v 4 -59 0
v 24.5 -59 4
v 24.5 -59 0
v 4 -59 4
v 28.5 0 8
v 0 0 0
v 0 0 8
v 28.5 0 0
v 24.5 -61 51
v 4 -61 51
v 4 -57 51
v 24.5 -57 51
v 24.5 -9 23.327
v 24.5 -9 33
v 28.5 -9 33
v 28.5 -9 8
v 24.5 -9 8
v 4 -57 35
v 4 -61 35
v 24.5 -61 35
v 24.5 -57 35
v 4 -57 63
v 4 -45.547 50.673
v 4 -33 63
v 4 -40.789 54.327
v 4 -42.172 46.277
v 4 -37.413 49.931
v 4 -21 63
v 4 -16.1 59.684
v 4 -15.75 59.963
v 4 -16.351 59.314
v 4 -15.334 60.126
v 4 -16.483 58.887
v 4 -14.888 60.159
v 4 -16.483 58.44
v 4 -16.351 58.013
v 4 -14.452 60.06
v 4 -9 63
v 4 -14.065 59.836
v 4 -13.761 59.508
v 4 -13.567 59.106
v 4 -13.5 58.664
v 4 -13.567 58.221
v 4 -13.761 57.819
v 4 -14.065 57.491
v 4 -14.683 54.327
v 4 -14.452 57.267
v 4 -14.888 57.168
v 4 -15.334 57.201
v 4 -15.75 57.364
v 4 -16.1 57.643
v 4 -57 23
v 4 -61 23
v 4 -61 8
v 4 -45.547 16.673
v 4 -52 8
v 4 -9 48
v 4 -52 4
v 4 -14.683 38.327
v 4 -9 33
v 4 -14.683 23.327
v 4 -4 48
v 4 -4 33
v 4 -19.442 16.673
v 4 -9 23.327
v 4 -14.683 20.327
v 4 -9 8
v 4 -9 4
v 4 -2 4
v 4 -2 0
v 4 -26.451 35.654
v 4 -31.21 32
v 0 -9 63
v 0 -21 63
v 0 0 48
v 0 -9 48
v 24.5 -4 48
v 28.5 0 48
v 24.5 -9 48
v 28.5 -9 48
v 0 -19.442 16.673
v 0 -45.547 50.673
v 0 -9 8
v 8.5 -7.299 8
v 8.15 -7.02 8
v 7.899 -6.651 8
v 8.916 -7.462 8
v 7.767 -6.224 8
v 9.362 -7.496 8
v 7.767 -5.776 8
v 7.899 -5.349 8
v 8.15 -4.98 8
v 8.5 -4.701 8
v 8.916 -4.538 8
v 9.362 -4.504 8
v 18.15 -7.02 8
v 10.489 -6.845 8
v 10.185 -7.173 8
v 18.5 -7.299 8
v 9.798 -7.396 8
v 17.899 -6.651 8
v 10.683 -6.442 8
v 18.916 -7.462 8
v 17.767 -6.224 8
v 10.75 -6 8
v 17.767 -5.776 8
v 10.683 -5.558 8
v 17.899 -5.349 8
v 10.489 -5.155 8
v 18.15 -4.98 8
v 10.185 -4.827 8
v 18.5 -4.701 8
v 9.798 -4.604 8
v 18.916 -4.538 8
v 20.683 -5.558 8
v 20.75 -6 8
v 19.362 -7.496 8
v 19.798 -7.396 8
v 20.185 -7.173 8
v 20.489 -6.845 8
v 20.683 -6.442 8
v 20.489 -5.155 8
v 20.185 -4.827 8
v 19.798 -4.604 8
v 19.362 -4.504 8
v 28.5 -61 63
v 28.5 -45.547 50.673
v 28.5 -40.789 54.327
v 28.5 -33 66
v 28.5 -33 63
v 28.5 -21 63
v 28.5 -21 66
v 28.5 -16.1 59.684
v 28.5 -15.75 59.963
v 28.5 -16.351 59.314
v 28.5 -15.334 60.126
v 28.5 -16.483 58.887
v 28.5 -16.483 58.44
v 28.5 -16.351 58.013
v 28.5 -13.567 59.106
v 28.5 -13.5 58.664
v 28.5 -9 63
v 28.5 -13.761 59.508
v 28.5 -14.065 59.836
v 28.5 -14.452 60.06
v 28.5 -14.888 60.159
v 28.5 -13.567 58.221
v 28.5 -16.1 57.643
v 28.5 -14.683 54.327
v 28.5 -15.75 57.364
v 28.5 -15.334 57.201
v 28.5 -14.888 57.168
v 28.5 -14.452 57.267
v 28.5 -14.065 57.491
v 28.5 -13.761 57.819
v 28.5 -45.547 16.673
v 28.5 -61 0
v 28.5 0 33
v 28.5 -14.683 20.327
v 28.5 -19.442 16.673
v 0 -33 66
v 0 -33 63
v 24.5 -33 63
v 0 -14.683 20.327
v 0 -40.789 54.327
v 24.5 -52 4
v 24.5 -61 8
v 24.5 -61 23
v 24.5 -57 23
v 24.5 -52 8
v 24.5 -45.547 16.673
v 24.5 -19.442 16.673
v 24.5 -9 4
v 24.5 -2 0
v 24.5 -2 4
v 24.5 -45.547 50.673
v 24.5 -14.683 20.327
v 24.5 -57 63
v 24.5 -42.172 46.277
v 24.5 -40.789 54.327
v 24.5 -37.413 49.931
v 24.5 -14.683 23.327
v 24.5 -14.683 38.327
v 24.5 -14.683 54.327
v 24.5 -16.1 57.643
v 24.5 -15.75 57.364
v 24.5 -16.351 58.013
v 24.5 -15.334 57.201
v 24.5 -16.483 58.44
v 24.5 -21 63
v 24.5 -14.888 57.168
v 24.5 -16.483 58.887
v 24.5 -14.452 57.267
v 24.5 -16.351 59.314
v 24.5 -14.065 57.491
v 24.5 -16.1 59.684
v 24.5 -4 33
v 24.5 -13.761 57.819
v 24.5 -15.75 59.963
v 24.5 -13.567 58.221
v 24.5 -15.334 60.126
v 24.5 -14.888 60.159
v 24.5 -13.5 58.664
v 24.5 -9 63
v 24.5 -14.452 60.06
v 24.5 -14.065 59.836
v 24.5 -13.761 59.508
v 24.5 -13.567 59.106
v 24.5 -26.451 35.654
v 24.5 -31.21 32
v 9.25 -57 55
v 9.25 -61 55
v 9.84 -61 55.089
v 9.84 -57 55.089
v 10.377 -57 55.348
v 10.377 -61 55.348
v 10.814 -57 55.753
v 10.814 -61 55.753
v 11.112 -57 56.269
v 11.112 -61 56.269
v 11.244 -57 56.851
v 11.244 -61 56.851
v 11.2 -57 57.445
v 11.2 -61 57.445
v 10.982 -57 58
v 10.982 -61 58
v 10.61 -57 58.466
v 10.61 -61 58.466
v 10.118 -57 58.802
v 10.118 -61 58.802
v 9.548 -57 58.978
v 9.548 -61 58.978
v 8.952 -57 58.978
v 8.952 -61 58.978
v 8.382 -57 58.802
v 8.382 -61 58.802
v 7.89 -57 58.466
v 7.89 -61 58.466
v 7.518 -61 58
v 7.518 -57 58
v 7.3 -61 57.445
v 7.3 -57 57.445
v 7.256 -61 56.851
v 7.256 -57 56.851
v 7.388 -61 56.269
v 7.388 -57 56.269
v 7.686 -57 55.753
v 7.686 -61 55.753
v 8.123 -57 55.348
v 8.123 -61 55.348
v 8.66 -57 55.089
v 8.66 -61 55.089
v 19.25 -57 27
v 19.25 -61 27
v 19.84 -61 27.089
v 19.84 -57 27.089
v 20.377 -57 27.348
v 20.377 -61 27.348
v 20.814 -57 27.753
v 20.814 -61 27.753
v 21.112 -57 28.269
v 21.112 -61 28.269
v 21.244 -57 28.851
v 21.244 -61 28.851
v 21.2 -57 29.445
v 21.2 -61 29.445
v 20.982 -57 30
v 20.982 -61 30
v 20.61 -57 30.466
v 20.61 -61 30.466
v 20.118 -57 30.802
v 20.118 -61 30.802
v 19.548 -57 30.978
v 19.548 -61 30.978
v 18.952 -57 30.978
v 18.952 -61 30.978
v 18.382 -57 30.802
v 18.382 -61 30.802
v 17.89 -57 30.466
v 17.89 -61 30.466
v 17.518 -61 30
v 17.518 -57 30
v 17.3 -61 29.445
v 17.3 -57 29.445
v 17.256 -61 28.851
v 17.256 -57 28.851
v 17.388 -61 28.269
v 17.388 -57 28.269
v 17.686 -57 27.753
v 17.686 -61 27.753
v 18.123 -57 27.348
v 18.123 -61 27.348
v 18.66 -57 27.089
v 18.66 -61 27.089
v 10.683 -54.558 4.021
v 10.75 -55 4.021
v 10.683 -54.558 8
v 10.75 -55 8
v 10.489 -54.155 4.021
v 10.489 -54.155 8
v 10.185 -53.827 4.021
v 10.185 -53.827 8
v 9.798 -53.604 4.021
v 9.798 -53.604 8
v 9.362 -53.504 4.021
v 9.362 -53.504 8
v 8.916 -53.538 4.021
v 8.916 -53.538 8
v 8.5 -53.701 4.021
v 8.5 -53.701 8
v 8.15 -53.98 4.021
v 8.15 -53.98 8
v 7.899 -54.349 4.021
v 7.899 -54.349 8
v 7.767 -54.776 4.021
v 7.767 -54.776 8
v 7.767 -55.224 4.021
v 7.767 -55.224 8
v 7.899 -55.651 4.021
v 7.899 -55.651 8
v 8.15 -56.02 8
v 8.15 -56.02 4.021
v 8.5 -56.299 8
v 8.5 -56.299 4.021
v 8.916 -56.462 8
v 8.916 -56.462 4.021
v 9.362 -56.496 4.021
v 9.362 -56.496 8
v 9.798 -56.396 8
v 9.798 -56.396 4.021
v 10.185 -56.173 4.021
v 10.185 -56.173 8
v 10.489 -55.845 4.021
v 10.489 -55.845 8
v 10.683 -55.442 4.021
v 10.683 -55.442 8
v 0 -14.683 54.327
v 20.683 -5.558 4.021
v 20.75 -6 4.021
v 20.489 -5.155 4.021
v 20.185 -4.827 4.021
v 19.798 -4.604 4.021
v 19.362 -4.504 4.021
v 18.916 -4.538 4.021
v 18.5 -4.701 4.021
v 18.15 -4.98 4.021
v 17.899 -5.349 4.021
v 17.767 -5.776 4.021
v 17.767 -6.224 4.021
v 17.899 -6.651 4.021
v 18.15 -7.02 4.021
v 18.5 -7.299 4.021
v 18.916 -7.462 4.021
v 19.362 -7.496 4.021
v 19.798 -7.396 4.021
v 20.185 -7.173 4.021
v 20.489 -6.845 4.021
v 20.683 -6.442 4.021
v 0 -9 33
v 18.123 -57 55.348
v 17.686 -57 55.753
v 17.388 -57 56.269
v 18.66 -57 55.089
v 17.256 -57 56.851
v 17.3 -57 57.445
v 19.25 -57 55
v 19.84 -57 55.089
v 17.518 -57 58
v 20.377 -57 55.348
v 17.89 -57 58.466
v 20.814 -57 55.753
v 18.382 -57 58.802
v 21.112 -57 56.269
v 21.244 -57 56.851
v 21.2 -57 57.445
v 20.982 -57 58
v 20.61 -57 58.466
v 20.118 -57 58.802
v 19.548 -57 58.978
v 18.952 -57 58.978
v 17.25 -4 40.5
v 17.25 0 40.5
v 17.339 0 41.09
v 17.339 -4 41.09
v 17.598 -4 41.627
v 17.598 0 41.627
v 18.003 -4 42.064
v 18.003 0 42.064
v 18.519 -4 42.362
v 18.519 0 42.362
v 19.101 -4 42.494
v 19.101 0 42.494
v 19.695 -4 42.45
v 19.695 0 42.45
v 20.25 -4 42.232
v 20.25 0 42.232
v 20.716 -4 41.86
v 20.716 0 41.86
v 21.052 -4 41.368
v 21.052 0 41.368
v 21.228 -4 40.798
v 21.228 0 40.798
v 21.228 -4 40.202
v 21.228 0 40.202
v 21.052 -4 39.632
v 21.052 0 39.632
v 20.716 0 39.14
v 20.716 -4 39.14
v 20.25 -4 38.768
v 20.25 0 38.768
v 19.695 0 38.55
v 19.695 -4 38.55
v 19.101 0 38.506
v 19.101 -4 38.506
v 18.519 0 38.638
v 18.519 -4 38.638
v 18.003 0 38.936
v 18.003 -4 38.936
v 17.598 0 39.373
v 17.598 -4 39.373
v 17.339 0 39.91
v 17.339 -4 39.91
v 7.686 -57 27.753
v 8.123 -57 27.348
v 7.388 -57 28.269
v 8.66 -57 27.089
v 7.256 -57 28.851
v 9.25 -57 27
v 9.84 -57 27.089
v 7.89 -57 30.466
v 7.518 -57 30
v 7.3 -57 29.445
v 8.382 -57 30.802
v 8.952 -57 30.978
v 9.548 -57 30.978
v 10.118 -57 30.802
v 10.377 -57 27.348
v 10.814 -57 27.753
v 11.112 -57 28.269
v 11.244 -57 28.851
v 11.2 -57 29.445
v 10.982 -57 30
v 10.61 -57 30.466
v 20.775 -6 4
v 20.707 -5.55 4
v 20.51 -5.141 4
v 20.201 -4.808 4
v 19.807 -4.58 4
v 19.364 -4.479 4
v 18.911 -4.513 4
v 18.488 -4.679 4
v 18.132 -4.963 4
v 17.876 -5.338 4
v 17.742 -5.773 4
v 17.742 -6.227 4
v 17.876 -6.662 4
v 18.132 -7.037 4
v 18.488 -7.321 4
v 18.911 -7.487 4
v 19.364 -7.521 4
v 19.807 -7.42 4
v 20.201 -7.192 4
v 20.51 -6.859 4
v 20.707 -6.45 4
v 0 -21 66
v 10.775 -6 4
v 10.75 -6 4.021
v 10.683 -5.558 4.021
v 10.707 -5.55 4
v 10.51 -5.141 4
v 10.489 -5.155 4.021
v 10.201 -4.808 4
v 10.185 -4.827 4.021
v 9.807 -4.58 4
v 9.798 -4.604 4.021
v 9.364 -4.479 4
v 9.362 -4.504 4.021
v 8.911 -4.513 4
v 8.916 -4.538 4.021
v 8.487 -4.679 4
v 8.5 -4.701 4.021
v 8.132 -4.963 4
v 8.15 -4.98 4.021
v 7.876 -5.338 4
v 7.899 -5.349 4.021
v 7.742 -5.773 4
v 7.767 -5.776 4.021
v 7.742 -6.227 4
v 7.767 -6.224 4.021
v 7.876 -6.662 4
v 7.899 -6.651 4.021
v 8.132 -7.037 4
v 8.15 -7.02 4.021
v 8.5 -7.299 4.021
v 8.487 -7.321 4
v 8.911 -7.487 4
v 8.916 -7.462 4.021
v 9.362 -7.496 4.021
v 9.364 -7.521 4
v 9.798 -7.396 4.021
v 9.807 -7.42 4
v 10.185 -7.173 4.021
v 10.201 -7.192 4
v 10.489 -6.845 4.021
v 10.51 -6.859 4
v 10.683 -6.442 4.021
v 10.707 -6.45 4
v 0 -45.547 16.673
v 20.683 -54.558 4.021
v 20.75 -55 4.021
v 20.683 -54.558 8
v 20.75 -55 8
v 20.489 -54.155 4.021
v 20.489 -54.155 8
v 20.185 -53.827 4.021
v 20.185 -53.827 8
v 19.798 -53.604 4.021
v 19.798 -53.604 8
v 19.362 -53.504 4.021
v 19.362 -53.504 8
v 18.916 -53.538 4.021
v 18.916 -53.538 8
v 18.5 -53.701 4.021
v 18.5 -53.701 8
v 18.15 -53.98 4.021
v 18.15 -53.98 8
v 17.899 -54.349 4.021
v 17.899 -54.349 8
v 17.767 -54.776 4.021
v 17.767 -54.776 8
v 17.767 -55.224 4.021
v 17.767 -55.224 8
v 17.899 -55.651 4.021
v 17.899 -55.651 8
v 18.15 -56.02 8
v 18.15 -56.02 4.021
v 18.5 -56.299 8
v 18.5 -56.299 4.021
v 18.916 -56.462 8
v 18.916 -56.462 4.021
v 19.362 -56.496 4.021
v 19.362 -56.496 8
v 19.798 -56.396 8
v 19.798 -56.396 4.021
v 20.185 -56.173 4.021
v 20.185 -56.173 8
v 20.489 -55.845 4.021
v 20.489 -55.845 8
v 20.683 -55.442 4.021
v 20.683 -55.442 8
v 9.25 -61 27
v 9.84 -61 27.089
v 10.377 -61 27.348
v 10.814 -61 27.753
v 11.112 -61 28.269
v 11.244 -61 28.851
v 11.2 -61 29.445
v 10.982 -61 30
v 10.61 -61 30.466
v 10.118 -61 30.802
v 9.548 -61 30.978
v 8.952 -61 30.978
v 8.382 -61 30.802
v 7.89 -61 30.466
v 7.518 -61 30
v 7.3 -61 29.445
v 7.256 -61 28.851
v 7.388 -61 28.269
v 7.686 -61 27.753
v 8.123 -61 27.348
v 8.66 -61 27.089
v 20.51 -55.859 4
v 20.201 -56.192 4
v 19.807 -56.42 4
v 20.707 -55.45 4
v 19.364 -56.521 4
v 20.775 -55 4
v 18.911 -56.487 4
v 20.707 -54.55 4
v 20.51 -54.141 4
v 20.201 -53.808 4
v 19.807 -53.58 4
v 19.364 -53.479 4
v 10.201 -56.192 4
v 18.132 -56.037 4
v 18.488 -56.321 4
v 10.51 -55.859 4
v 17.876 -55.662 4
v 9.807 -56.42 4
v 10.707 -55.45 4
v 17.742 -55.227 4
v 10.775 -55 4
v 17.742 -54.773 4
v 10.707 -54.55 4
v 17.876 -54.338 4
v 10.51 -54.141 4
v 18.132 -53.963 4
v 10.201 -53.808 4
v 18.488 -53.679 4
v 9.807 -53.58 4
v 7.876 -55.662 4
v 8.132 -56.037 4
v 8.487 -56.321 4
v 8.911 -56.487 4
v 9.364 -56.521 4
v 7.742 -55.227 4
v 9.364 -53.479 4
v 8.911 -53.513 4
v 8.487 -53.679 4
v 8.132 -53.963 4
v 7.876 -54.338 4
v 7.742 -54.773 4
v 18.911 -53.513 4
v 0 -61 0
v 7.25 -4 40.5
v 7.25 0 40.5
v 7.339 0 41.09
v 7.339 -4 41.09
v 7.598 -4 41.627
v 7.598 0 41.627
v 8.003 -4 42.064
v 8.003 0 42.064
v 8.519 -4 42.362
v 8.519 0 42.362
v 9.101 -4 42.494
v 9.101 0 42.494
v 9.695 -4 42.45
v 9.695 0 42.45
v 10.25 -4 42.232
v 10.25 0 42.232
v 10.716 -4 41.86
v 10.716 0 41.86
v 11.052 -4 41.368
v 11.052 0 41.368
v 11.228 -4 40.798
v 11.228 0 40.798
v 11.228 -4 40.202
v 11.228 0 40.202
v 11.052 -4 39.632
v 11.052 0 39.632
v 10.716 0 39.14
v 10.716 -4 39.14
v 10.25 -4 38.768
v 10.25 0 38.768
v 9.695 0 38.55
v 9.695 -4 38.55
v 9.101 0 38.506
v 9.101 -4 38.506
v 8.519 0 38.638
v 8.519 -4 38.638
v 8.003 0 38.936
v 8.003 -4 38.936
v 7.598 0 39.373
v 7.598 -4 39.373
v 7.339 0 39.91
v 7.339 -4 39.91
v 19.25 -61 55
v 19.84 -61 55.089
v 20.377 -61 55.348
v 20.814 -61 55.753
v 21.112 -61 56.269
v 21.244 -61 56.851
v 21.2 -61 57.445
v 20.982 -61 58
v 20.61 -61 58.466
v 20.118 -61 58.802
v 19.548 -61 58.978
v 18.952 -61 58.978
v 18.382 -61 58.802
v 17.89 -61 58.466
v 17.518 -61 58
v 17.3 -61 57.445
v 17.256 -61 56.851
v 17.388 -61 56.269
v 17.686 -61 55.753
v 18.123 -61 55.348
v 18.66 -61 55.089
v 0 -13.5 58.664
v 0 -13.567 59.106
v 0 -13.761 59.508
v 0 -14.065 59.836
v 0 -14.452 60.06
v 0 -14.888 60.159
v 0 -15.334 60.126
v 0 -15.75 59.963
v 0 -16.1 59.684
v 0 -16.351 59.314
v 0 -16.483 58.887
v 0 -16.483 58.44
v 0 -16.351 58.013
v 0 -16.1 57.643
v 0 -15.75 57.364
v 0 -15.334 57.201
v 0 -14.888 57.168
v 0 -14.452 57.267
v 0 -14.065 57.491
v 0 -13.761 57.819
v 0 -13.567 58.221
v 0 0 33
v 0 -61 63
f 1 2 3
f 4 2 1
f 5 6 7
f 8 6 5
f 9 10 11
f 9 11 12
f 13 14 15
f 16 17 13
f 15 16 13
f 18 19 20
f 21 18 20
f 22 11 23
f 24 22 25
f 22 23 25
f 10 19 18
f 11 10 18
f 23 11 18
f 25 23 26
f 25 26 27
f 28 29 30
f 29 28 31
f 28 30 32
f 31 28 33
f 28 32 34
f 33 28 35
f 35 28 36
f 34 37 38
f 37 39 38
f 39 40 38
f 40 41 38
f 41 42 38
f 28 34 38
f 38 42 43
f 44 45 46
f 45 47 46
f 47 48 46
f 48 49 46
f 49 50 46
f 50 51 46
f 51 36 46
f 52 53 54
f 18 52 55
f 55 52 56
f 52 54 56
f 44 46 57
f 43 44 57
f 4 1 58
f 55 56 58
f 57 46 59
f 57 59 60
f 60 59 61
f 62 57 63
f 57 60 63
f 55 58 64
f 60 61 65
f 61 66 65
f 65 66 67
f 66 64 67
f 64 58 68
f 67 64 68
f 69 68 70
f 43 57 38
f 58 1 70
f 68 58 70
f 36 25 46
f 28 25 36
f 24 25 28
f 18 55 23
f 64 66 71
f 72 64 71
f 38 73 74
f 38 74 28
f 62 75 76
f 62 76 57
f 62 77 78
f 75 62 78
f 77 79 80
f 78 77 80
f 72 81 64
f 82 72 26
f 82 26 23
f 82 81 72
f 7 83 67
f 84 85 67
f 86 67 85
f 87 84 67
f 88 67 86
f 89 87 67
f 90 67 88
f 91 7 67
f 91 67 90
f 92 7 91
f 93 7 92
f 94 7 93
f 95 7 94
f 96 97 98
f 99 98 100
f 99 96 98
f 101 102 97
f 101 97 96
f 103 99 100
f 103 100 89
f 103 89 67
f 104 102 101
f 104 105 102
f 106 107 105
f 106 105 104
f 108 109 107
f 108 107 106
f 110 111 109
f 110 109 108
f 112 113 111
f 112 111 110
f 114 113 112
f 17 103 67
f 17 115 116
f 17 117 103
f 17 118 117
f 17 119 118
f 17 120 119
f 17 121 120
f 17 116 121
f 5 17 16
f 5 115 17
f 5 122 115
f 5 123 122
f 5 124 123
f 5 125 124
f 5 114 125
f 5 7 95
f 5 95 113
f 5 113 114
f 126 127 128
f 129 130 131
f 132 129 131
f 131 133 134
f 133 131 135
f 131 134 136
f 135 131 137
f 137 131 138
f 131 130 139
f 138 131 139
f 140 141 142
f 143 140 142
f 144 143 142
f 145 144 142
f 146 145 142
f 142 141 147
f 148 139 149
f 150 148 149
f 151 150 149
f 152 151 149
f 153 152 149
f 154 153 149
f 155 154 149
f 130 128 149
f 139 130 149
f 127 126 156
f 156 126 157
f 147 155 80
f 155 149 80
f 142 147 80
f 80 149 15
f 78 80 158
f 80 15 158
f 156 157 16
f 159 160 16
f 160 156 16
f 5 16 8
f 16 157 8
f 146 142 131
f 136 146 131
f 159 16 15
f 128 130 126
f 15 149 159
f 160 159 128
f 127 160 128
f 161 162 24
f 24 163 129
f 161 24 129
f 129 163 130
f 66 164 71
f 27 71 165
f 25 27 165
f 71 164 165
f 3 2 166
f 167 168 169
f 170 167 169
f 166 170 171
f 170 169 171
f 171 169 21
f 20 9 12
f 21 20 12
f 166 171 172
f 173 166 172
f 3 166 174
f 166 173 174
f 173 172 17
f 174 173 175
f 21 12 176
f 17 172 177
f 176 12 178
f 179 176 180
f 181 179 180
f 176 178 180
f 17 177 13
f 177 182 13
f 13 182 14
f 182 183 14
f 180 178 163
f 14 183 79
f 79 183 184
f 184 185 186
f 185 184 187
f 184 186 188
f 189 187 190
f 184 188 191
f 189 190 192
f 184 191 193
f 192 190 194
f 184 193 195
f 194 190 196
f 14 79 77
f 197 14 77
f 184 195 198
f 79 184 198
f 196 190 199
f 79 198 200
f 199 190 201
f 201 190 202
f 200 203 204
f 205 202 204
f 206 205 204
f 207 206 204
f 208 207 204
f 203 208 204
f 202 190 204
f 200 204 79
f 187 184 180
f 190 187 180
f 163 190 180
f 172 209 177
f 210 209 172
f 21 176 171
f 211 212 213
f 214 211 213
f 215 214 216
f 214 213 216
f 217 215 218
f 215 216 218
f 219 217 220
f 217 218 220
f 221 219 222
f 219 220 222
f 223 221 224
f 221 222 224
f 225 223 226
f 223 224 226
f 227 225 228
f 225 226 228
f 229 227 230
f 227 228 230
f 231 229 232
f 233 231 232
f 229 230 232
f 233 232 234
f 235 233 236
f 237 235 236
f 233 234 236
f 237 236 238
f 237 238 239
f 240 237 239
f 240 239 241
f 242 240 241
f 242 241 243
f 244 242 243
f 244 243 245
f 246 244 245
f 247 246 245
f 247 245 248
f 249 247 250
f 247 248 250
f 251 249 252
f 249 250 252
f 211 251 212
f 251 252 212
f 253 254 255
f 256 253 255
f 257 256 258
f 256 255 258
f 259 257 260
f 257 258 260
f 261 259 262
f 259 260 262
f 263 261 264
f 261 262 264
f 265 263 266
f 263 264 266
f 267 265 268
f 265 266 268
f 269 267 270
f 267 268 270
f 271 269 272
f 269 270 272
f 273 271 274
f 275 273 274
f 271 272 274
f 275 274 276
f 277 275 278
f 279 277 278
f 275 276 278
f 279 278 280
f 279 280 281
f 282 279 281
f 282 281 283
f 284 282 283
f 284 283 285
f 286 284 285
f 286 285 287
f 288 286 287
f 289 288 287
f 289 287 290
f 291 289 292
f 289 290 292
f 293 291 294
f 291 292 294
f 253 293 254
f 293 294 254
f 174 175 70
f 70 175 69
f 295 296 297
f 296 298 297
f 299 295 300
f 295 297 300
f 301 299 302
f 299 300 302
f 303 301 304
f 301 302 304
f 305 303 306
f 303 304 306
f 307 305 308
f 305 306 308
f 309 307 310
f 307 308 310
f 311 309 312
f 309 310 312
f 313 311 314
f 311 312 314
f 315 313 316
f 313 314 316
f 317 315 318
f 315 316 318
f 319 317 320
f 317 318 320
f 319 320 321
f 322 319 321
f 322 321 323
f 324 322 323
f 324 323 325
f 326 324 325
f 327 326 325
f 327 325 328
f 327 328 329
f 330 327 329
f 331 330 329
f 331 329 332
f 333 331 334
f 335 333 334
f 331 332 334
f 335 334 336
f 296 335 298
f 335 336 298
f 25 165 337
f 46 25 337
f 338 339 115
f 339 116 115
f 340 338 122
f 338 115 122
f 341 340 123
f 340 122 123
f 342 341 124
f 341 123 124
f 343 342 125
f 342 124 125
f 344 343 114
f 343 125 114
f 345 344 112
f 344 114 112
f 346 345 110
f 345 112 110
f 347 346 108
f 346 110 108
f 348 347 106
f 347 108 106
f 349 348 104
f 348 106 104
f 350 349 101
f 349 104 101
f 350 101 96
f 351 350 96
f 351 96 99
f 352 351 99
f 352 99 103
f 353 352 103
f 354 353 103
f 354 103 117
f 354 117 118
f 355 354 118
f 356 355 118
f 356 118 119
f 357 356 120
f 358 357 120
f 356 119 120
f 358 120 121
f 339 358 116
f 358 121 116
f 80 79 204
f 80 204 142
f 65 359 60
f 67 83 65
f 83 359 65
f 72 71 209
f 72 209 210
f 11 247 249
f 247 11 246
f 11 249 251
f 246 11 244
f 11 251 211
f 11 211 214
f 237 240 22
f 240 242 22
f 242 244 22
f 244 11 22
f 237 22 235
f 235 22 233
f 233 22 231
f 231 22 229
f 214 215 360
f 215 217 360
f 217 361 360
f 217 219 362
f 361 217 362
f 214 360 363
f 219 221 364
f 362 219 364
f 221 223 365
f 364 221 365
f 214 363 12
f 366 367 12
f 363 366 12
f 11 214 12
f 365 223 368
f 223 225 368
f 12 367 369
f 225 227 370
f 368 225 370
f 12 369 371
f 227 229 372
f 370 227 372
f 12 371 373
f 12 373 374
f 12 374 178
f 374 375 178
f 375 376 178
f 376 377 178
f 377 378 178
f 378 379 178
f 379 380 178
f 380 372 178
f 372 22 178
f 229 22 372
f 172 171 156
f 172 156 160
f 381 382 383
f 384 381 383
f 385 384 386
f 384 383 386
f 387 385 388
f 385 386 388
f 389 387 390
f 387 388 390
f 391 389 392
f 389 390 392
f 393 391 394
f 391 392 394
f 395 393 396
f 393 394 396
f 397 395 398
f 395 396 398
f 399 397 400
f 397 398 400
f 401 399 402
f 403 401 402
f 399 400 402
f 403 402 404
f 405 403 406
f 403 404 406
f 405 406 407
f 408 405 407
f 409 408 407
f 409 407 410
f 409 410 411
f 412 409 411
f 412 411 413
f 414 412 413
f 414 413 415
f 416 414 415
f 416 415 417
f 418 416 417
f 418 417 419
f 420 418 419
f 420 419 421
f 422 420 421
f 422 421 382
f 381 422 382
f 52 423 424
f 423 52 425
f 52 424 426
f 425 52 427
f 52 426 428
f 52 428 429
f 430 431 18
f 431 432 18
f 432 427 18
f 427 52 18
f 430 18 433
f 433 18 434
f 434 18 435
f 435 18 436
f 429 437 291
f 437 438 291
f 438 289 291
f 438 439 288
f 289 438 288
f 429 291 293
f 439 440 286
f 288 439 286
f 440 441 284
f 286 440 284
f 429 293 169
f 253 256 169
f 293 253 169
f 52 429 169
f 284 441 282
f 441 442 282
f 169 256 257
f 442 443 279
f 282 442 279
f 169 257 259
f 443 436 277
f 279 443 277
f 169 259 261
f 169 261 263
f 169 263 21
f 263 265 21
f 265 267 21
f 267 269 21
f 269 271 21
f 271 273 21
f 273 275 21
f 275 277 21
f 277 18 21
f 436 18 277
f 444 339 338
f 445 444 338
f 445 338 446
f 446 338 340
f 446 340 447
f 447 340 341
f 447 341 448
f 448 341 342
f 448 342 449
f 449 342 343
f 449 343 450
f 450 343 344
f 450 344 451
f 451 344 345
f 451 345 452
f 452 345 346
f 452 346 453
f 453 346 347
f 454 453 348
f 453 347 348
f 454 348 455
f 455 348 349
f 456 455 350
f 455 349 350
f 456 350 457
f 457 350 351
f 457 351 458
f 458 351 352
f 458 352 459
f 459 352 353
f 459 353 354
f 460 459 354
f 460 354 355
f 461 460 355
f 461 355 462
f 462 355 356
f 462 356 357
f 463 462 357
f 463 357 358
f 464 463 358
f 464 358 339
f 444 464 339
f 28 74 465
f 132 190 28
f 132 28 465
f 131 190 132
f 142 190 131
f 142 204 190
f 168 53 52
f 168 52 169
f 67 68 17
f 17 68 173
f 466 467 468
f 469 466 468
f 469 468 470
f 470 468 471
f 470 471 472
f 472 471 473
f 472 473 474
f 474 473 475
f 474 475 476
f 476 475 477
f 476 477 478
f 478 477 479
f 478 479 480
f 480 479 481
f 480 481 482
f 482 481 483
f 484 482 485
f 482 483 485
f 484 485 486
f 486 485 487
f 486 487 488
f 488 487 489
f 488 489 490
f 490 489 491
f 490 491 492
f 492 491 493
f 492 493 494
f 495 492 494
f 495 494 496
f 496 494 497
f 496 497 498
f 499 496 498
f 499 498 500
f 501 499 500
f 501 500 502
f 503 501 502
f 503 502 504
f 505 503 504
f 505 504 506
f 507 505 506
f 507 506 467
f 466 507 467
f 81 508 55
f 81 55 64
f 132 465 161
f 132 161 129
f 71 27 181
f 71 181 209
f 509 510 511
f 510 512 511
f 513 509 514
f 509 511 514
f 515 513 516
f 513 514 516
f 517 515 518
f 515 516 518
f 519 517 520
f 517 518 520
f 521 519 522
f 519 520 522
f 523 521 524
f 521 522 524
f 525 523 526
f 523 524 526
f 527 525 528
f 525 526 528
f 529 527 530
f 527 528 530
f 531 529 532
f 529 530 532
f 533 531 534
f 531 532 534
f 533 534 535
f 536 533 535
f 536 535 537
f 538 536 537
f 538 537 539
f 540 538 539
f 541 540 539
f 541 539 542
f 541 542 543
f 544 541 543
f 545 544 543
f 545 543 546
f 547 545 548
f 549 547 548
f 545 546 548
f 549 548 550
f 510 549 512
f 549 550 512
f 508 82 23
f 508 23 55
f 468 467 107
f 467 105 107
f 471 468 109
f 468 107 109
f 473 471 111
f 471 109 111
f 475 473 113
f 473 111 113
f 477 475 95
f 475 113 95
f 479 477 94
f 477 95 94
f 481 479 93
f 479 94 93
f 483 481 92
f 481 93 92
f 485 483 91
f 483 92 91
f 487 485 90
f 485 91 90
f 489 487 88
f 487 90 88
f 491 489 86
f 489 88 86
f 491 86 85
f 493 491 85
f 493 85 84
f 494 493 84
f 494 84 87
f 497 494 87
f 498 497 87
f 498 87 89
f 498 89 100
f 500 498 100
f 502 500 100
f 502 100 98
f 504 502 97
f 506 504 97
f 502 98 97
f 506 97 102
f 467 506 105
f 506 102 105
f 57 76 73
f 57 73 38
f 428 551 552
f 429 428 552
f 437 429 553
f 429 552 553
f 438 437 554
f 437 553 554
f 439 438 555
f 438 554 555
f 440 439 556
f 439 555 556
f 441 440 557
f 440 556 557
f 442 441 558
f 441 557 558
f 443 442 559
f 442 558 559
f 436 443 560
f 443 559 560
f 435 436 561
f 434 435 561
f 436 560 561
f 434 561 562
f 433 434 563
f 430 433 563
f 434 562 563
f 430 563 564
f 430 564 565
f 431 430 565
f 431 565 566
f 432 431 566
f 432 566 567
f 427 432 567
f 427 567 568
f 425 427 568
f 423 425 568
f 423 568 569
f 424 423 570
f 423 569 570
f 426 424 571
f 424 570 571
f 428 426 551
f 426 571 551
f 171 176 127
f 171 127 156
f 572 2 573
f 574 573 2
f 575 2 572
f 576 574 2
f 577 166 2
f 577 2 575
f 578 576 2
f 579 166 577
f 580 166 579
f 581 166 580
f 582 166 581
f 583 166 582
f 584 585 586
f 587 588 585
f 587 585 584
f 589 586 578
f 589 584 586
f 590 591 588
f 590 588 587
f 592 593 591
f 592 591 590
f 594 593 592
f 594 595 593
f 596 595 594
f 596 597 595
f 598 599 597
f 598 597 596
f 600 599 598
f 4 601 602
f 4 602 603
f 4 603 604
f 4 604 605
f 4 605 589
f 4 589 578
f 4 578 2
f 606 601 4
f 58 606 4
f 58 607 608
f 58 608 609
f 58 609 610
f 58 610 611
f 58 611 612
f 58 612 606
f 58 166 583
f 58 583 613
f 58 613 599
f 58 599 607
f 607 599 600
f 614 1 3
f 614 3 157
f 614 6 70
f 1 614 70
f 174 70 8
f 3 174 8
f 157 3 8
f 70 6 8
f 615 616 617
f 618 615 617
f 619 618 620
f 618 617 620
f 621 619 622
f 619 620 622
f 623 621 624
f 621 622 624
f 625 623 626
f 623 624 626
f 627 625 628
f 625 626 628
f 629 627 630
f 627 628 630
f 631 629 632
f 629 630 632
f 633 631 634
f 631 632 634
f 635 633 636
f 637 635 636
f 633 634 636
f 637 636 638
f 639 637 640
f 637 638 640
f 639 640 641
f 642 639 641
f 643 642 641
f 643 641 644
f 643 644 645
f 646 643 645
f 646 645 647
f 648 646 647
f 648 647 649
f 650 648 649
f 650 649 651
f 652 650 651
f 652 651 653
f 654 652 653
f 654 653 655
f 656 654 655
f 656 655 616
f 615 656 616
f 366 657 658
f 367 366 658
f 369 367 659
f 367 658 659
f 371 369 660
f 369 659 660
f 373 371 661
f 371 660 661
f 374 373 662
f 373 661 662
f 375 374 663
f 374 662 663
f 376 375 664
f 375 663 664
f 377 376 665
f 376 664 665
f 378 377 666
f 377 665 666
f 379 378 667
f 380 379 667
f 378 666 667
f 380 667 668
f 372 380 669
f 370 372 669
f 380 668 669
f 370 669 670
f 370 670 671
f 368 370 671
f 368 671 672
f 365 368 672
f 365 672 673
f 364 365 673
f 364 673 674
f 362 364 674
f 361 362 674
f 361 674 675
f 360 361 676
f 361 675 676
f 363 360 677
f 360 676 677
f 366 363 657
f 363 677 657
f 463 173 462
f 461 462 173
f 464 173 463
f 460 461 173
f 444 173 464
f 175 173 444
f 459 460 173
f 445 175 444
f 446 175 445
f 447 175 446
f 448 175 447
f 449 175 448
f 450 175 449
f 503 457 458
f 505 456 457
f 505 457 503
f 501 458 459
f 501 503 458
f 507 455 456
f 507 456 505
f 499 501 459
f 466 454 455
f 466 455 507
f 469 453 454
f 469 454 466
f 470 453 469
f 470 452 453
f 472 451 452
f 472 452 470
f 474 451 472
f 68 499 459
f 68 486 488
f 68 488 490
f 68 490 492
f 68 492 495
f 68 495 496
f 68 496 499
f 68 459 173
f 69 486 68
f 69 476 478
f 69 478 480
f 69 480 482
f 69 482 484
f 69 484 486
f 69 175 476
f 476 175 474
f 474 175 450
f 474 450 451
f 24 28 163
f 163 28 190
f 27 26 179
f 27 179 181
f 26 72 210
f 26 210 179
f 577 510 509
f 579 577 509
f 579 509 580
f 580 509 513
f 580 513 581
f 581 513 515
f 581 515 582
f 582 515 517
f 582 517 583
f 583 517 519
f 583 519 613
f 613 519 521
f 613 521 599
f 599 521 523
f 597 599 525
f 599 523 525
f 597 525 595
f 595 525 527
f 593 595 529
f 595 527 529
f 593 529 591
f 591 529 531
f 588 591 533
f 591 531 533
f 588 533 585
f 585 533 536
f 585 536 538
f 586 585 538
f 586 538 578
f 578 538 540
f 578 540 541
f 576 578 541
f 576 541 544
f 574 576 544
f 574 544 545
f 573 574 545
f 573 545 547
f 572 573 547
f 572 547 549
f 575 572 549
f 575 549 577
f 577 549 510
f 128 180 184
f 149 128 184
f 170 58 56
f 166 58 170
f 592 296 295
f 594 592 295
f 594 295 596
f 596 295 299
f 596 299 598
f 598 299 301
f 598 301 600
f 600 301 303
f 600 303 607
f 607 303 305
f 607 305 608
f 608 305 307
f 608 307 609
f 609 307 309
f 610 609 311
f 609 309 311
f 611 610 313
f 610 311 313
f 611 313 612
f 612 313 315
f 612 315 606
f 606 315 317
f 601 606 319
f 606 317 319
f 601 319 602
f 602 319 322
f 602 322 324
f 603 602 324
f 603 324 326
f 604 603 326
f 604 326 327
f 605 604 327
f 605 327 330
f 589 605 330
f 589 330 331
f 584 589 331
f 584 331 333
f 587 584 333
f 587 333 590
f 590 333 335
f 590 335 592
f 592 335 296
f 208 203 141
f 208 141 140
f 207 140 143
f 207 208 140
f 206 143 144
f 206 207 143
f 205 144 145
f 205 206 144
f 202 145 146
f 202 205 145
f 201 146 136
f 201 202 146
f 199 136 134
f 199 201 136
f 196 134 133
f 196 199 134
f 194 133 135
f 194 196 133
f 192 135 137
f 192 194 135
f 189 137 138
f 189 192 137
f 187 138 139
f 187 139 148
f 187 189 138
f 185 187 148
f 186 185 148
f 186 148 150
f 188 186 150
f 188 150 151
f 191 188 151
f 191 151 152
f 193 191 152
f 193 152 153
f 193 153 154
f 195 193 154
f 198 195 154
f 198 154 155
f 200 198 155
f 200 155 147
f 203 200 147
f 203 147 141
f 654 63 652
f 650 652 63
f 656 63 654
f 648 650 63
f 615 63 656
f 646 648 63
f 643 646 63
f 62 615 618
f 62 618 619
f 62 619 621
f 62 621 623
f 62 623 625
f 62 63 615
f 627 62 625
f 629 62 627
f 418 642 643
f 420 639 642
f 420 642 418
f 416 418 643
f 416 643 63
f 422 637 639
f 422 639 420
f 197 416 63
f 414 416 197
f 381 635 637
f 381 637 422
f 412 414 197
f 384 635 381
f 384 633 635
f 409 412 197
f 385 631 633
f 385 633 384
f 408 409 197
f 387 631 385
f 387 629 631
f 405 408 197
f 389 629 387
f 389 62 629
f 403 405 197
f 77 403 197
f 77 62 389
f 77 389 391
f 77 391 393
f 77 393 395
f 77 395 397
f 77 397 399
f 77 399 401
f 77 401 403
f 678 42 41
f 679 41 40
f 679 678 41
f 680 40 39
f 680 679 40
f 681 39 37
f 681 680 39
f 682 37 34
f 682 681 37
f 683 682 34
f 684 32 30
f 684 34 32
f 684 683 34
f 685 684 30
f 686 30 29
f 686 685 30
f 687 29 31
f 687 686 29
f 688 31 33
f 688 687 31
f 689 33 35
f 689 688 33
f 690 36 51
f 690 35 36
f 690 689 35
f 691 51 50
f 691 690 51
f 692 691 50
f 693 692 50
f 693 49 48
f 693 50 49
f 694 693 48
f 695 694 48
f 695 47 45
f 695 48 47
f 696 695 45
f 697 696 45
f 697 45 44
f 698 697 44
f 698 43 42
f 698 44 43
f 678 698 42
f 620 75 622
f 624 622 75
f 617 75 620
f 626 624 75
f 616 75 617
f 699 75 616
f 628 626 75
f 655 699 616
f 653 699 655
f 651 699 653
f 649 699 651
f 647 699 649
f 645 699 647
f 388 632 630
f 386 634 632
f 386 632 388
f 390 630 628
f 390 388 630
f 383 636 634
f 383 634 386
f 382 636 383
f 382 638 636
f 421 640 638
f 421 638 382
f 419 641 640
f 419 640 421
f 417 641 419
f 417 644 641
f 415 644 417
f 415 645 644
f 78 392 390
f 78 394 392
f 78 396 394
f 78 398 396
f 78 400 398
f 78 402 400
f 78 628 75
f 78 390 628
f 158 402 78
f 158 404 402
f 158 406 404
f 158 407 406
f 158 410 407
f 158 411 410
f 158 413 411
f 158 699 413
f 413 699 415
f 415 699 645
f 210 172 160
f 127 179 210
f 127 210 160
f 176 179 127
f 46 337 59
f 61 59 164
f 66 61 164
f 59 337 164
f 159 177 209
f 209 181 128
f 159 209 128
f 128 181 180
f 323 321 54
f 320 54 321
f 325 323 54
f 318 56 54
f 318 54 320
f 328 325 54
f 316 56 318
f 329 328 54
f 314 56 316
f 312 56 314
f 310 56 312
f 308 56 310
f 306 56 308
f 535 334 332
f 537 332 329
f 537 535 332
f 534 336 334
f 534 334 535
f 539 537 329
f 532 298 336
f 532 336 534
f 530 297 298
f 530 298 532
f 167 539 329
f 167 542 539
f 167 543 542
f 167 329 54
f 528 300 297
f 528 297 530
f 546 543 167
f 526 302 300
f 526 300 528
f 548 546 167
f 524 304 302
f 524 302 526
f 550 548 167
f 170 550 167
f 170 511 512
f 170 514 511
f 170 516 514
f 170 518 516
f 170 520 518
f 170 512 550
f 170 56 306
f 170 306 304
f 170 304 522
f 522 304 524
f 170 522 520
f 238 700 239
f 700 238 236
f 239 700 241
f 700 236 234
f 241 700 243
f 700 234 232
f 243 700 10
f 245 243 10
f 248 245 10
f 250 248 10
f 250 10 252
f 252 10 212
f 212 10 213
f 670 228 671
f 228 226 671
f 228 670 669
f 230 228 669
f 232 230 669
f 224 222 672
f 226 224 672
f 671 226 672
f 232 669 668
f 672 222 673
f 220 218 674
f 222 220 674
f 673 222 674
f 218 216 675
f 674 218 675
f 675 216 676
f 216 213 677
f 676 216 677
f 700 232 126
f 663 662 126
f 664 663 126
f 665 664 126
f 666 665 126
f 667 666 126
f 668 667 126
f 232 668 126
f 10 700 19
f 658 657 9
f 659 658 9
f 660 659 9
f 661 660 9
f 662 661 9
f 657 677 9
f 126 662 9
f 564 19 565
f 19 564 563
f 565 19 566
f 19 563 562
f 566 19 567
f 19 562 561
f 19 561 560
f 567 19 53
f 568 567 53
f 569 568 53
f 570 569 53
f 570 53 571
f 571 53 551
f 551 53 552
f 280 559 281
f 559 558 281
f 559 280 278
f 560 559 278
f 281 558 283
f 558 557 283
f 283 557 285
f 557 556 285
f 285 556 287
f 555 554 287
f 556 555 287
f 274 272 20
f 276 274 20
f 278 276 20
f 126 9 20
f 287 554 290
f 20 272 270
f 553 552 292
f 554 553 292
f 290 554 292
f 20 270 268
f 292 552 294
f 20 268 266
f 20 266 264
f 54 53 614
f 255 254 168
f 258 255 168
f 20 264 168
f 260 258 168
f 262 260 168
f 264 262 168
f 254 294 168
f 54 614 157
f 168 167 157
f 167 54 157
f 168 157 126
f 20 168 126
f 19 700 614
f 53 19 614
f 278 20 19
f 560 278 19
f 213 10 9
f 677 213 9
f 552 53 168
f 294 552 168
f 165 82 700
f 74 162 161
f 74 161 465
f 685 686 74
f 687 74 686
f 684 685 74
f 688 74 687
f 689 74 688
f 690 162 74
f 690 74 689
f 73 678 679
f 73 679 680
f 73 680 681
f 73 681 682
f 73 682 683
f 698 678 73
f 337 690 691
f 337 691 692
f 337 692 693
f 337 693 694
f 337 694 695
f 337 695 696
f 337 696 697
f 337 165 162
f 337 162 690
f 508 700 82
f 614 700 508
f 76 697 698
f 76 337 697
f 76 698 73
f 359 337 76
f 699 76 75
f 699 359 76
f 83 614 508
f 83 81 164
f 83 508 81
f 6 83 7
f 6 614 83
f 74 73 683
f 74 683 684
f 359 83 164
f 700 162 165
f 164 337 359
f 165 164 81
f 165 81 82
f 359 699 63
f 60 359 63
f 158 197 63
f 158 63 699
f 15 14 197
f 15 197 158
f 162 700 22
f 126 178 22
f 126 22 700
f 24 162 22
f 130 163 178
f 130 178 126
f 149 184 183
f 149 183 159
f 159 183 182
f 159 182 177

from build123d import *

# Parameters (mm, degrees)
SKETCH1_W                       = 28.5
SKETCH1_H                       = 61
SKETCH1_W_2                     = 20.5
SKETCH1_H_2                     = 43
BOSS_EXTRUDE1_DEPTH             = 8
SKETCH2_W                       = 4
SKETCH2_H                       = 52
BOSS_EXTRUDE2_DEPTH             = 55
SKETCH3_W                       = 28.5
SKETCH3_H                       = 12
BOSS_EXTRUDE3_DEPTH             = 4
CUT_EXTRUDE1_DEPTH              = 93.207646104
CUT_EXTRUDE1_DEPTH_BACK         = 93.207646104
SKETCH5_W                       = 15
SKETCH5_H                       = 5.682620757
BOSS_EXTRUDE4_DEPTH             = 20.5
CUT_EXTRUDE2_DEPTH              = 93.207646104
CUT_EXTRUDE2_DEPTH_BACK         = 4
SKETCH7_W                       = 20.5
SKETCH7_H                       = 7
F_3_0MM_DOWEL_HOLE1_D           = 3
F_3_0MM_DOWEL_HOLE1_DEPTH       = 4
F_3_0MM_DOWEL_HOLE1_CSINK_D     = 3.05
F_3_0MM_DOWEL_HOLE1_CSINK_ANGLE = 100
F_3_0MM_DOWEL_HOLE1_TIP         = 0.901290929
SKETCH19_R                      = 2
CUT_EXTRUDE3_DEPTH              = 4
SKETCH21_W                      = 28.5
SKETCH21_H                      = 15
BOSS_EXTRUDE5_DEPTH             = 9
SKETCH24_R                      = 2
CUT_EXTRUDE6_DEPTH              = 14.682620757
CUT_EXTRUDE7_START              = -15
CUT_EXTRUDE7_OUTLINE_W          = 20.5
CUT_EXTRUDE7_OUTLINE_H          = 5.682620757
CUT_EXTRUDE7_DEPTH              = 15
BOSS_EXTRUDE6_DEPTH             = 20.5
SKETCH27_W                      = 28.5
SKETCH27_H                      = 12
BOSS_EXTRUDE7_DEPTH             = 3
SKETCH28_W                      = 20.5
SKETCH28_H                      = 5
CUT_EXTRUDE8_DEPTH              = 15
CUT_EXTRUDE9_START              = -28.5
SKETCH29_R                      = 1.5
CUT_EXTRUDE9_DEPTH              = 28.5


# Read off the part's stored shape, not the designer's step: Cut-Extrude7
with BuildPart() as part:
    # Sketch1 → Boss-Extrude1 (new body)
    with BuildSketch(Plane.XY):
        with Locations((14.25, -30.5)):
            Rectangle(SKETCH1_W, SKETCH1_H)
        with Locations((14.25, -30.5)):
            Rectangle(SKETCH1_W_2, SKETCH1_H_2, mode=Mode.SUBTRACT)
    extrude(amount=BOSS_EXTRUDE1_DEPTH)

    # Sketch2 → Boss-Extrude2 (add)
    with BuildSketch(Plane.XY.offset(8)):
        with Locations((2, -35)):
            Rectangle(SKETCH2_W, SKETCH2_H)
        with Locations((26.5, -35)):
            Rectangle(SKETCH2_W, SKETCH2_H)
    extrude(amount=BOSS_EXTRUDE2_DEPTH)

    # Sketch3 → Boss-Extrude3 (add)
    with BuildSketch(Plane.XZ.offset(61)):
        with Locations((14.25, 57)):
            Rectangle(SKETCH3_W, SKETCH3_H)
        with Locations((14.25, 29)):
            Rectangle(SKETCH3_W, SKETCH3_H)
    extrude(amount=-BOSS_EXTRUDE3_DEPTH)

    # Sketch4 → Cut-Extrude1 (cut, two sides: drawn at the far end of the back side and taken through both)
    with BuildSketch(Plane(origin=(28.5, 0, 0), x_dir=(0, 0, -1), z_dir=(1, 0, 0)).offset(-CUT_EXTRUDE1_DEPTH_BACK)):
        Polygon((-54.327023097, -40.788512694), (-54.327023097, -14.682620757), (-20.327023097, -14.682620757), align=None)
        Polygon((-50.672976903, -45.547498554), (-16.672976903, -45.547498554), (-16.672976903, -19.441606616), align=None)
    extrude(amount=CUT_EXTRUDE1_DEPTH + CUT_EXTRUDE1_DEPTH_BACK, mode=Mode.SUBTRACT)

    # Sketch5 → Boss-Extrude4 (add)
    with BuildSketch(Plane(origin=(4, 0, 0), x_dir=(0, 0, -1), z_dir=(1, 0, 0))):
        with Locations((-30.827023097, -11.841310379)):
            Rectangle(SKETCH5_W, SKETCH5_H)
    extrude(amount=BOSS_EXTRUDE4_DEPTH)

    # Sketch7 → Cut-Extrude2 (cut, two sides: drawn at the far end of the back side and taken through both)
    with BuildSketch(Plane(origin=(0, 0, 0), x_dir=(-1, 0, 0), z_dir=(0, 0, -1)).offset(-CUT_EXTRUDE2_DEPTH_BACK)):
        with Locations((-14.25, -5.5)):
            Rectangle(SKETCH7_W, SKETCH7_H)
        with Locations((-14.25, -55.5)):
            Rectangle(SKETCH7_W, SKETCH7_H)
    extrude(amount=CUT_EXTRUDE2_DEPTH + CUT_EXTRUDE2_DEPTH_BACK, mode=Mode.SUBTRACT)

    # Ø3.0mm Dowel Hole1
    with Locations(Plane(origin=(0, 0, 4), x_dir=(-1, 0, 0), z_dir=(0, 0, -1))):
        with Locations((-19.25, -55), (-9.25, -55), (-19.25, -6), (-9.25, -6)):
            CounterSinkHole(F_3_0MM_DOWEL_HOLE1_D / 2, F_3_0MM_DOWEL_HOLE1_CSINK_D / 2, depth=F_3_0MM_DOWEL_HOLE1_DEPTH, counter_sink_angle=F_3_0MM_DOWEL_HOLE1_CSINK_ANGLE)
            with Locations((0, 0, -(F_3_0MM_DOWEL_HOLE1_DEPTH + F_3_0MM_DOWEL_HOLE1_TIP / 2))):  # 118° drill point
                Cone(0, F_3_0MM_DOWEL_HOLE1_D / 2, F_3_0MM_DOWEL_HOLE1_TIP, mode=Mode.SUBTRACT)

    # Sketch19 → Cut-Extrude3 (cut)
    with BuildSketch(Plane.XZ.offset(61)):
        with Locations(Location((9.25, 57, 0), (0, 0, 270))):
            Circle(SKETCH19_R)
        with Locations(Location((19.25, 57, 0), (0, 0, 270))):
            Circle(SKETCH19_R)
        with Locations(Location((9.25, 29, 0), (0, 0, 270))):
            Circle(SKETCH19_R)
        with Locations(Location((19.25, 29, 0), (0, 0, 270))):
            Circle(SKETCH19_R)
    extrude(amount=-CUT_EXTRUDE3_DEPTH, mode=Mode.SUBTRACT)

    # Sketch21 → Boss-Extrude5 (add)
    with BuildSketch(Plane(origin=(0, -9, 0), x_dir=(1, 0, 0), z_dir=(0, 1, 0))):
        with Locations((14.25, -40.5)):
            Rectangle(SKETCH21_W, SKETCH21_H)
    extrude(amount=BOSS_EXTRUDE5_DEPTH)

    # Sketch24 → Cut-Extrude6 (cut)
    with BuildSketch(Plane(origin=(0, 0, 0), x_dir=(1, 0, 0), z_dir=(0, 1, 0))):
        with Locations(Location((9.25, -40.5, 0), (0, 0, 180))):
            Circle(SKETCH24_R)
        with Locations(Location((19.25, -40.5, 0), (0, 0, 180))):
            Circle(SKETCH24_R)
    extrude(amount=-CUT_EXTRUDE6_DEPTH, mode=Mode.SUBTRACT)

    # Cut-Extrude7 outline → Cut-Extrude7 (cut)
    with BuildSketch(Plane.XY.offset(38.327023097).offset(CUT_EXTRUDE7_START)):
        with Locations((14.25, -11.841310379)):
            Rectangle(CUT_EXTRUDE7_OUTLINE_W, CUT_EXTRUDE7_OUTLINE_H)
    extrude(amount=CUT_EXTRUDE7_DEPTH, mode=Mode.SUBTRACT)

    # Sketch26 → Boss-Extrude6 (add)
    with BuildSketch(Plane(origin=(4, 0, 0), x_dir=(0, 0, -1), z_dir=(1, 0, 0))):
        Polygon((-46.276957579, -42.172145453), (-49.931003773, -37.413159593), (-35.654046194, -26.451021012), (-32, -31.210006872), align=None)
    extrude(amount=BOSS_EXTRUDE6_DEPTH)

    # Sketch27 → Boss-Extrude7 (add)
    with BuildSketch(Plane.XY.offset(63)):
        with Locations((14.25, -27)):
            Rectangle(SKETCH27_W, SKETCH27_H)
    extrude(amount=BOSS_EXTRUDE7_DEPTH)

    # Sketch28 → Cut-Extrude8 (cut)
    with BuildSketch(Plane.XY.offset(48)):
        with Locations((14.25, -6.5)):
            Rectangle(SKETCH28_W, SKETCH28_H)
    extrude(amount=-CUT_EXTRUDE8_DEPTH, mode=Mode.SUBTRACT)

    # Sketch29 → Cut-Extrude9 (cut)
    with BuildSketch(Plane(origin=(28.5, 0, 0), x_dir=(0, 0, -1), z_dir=(1, 0, 0)).offset(CUT_EXTRUDE9_START)):
        with Locations(Location((-58.663511548, -15, 0), (0, 0, 90))):
            Circle(SKETCH29_R)
    extrude(amount=CUT_EXTRUDE9_DEPTH, mode=Mode.SUBTRACT)


solid = part.part
